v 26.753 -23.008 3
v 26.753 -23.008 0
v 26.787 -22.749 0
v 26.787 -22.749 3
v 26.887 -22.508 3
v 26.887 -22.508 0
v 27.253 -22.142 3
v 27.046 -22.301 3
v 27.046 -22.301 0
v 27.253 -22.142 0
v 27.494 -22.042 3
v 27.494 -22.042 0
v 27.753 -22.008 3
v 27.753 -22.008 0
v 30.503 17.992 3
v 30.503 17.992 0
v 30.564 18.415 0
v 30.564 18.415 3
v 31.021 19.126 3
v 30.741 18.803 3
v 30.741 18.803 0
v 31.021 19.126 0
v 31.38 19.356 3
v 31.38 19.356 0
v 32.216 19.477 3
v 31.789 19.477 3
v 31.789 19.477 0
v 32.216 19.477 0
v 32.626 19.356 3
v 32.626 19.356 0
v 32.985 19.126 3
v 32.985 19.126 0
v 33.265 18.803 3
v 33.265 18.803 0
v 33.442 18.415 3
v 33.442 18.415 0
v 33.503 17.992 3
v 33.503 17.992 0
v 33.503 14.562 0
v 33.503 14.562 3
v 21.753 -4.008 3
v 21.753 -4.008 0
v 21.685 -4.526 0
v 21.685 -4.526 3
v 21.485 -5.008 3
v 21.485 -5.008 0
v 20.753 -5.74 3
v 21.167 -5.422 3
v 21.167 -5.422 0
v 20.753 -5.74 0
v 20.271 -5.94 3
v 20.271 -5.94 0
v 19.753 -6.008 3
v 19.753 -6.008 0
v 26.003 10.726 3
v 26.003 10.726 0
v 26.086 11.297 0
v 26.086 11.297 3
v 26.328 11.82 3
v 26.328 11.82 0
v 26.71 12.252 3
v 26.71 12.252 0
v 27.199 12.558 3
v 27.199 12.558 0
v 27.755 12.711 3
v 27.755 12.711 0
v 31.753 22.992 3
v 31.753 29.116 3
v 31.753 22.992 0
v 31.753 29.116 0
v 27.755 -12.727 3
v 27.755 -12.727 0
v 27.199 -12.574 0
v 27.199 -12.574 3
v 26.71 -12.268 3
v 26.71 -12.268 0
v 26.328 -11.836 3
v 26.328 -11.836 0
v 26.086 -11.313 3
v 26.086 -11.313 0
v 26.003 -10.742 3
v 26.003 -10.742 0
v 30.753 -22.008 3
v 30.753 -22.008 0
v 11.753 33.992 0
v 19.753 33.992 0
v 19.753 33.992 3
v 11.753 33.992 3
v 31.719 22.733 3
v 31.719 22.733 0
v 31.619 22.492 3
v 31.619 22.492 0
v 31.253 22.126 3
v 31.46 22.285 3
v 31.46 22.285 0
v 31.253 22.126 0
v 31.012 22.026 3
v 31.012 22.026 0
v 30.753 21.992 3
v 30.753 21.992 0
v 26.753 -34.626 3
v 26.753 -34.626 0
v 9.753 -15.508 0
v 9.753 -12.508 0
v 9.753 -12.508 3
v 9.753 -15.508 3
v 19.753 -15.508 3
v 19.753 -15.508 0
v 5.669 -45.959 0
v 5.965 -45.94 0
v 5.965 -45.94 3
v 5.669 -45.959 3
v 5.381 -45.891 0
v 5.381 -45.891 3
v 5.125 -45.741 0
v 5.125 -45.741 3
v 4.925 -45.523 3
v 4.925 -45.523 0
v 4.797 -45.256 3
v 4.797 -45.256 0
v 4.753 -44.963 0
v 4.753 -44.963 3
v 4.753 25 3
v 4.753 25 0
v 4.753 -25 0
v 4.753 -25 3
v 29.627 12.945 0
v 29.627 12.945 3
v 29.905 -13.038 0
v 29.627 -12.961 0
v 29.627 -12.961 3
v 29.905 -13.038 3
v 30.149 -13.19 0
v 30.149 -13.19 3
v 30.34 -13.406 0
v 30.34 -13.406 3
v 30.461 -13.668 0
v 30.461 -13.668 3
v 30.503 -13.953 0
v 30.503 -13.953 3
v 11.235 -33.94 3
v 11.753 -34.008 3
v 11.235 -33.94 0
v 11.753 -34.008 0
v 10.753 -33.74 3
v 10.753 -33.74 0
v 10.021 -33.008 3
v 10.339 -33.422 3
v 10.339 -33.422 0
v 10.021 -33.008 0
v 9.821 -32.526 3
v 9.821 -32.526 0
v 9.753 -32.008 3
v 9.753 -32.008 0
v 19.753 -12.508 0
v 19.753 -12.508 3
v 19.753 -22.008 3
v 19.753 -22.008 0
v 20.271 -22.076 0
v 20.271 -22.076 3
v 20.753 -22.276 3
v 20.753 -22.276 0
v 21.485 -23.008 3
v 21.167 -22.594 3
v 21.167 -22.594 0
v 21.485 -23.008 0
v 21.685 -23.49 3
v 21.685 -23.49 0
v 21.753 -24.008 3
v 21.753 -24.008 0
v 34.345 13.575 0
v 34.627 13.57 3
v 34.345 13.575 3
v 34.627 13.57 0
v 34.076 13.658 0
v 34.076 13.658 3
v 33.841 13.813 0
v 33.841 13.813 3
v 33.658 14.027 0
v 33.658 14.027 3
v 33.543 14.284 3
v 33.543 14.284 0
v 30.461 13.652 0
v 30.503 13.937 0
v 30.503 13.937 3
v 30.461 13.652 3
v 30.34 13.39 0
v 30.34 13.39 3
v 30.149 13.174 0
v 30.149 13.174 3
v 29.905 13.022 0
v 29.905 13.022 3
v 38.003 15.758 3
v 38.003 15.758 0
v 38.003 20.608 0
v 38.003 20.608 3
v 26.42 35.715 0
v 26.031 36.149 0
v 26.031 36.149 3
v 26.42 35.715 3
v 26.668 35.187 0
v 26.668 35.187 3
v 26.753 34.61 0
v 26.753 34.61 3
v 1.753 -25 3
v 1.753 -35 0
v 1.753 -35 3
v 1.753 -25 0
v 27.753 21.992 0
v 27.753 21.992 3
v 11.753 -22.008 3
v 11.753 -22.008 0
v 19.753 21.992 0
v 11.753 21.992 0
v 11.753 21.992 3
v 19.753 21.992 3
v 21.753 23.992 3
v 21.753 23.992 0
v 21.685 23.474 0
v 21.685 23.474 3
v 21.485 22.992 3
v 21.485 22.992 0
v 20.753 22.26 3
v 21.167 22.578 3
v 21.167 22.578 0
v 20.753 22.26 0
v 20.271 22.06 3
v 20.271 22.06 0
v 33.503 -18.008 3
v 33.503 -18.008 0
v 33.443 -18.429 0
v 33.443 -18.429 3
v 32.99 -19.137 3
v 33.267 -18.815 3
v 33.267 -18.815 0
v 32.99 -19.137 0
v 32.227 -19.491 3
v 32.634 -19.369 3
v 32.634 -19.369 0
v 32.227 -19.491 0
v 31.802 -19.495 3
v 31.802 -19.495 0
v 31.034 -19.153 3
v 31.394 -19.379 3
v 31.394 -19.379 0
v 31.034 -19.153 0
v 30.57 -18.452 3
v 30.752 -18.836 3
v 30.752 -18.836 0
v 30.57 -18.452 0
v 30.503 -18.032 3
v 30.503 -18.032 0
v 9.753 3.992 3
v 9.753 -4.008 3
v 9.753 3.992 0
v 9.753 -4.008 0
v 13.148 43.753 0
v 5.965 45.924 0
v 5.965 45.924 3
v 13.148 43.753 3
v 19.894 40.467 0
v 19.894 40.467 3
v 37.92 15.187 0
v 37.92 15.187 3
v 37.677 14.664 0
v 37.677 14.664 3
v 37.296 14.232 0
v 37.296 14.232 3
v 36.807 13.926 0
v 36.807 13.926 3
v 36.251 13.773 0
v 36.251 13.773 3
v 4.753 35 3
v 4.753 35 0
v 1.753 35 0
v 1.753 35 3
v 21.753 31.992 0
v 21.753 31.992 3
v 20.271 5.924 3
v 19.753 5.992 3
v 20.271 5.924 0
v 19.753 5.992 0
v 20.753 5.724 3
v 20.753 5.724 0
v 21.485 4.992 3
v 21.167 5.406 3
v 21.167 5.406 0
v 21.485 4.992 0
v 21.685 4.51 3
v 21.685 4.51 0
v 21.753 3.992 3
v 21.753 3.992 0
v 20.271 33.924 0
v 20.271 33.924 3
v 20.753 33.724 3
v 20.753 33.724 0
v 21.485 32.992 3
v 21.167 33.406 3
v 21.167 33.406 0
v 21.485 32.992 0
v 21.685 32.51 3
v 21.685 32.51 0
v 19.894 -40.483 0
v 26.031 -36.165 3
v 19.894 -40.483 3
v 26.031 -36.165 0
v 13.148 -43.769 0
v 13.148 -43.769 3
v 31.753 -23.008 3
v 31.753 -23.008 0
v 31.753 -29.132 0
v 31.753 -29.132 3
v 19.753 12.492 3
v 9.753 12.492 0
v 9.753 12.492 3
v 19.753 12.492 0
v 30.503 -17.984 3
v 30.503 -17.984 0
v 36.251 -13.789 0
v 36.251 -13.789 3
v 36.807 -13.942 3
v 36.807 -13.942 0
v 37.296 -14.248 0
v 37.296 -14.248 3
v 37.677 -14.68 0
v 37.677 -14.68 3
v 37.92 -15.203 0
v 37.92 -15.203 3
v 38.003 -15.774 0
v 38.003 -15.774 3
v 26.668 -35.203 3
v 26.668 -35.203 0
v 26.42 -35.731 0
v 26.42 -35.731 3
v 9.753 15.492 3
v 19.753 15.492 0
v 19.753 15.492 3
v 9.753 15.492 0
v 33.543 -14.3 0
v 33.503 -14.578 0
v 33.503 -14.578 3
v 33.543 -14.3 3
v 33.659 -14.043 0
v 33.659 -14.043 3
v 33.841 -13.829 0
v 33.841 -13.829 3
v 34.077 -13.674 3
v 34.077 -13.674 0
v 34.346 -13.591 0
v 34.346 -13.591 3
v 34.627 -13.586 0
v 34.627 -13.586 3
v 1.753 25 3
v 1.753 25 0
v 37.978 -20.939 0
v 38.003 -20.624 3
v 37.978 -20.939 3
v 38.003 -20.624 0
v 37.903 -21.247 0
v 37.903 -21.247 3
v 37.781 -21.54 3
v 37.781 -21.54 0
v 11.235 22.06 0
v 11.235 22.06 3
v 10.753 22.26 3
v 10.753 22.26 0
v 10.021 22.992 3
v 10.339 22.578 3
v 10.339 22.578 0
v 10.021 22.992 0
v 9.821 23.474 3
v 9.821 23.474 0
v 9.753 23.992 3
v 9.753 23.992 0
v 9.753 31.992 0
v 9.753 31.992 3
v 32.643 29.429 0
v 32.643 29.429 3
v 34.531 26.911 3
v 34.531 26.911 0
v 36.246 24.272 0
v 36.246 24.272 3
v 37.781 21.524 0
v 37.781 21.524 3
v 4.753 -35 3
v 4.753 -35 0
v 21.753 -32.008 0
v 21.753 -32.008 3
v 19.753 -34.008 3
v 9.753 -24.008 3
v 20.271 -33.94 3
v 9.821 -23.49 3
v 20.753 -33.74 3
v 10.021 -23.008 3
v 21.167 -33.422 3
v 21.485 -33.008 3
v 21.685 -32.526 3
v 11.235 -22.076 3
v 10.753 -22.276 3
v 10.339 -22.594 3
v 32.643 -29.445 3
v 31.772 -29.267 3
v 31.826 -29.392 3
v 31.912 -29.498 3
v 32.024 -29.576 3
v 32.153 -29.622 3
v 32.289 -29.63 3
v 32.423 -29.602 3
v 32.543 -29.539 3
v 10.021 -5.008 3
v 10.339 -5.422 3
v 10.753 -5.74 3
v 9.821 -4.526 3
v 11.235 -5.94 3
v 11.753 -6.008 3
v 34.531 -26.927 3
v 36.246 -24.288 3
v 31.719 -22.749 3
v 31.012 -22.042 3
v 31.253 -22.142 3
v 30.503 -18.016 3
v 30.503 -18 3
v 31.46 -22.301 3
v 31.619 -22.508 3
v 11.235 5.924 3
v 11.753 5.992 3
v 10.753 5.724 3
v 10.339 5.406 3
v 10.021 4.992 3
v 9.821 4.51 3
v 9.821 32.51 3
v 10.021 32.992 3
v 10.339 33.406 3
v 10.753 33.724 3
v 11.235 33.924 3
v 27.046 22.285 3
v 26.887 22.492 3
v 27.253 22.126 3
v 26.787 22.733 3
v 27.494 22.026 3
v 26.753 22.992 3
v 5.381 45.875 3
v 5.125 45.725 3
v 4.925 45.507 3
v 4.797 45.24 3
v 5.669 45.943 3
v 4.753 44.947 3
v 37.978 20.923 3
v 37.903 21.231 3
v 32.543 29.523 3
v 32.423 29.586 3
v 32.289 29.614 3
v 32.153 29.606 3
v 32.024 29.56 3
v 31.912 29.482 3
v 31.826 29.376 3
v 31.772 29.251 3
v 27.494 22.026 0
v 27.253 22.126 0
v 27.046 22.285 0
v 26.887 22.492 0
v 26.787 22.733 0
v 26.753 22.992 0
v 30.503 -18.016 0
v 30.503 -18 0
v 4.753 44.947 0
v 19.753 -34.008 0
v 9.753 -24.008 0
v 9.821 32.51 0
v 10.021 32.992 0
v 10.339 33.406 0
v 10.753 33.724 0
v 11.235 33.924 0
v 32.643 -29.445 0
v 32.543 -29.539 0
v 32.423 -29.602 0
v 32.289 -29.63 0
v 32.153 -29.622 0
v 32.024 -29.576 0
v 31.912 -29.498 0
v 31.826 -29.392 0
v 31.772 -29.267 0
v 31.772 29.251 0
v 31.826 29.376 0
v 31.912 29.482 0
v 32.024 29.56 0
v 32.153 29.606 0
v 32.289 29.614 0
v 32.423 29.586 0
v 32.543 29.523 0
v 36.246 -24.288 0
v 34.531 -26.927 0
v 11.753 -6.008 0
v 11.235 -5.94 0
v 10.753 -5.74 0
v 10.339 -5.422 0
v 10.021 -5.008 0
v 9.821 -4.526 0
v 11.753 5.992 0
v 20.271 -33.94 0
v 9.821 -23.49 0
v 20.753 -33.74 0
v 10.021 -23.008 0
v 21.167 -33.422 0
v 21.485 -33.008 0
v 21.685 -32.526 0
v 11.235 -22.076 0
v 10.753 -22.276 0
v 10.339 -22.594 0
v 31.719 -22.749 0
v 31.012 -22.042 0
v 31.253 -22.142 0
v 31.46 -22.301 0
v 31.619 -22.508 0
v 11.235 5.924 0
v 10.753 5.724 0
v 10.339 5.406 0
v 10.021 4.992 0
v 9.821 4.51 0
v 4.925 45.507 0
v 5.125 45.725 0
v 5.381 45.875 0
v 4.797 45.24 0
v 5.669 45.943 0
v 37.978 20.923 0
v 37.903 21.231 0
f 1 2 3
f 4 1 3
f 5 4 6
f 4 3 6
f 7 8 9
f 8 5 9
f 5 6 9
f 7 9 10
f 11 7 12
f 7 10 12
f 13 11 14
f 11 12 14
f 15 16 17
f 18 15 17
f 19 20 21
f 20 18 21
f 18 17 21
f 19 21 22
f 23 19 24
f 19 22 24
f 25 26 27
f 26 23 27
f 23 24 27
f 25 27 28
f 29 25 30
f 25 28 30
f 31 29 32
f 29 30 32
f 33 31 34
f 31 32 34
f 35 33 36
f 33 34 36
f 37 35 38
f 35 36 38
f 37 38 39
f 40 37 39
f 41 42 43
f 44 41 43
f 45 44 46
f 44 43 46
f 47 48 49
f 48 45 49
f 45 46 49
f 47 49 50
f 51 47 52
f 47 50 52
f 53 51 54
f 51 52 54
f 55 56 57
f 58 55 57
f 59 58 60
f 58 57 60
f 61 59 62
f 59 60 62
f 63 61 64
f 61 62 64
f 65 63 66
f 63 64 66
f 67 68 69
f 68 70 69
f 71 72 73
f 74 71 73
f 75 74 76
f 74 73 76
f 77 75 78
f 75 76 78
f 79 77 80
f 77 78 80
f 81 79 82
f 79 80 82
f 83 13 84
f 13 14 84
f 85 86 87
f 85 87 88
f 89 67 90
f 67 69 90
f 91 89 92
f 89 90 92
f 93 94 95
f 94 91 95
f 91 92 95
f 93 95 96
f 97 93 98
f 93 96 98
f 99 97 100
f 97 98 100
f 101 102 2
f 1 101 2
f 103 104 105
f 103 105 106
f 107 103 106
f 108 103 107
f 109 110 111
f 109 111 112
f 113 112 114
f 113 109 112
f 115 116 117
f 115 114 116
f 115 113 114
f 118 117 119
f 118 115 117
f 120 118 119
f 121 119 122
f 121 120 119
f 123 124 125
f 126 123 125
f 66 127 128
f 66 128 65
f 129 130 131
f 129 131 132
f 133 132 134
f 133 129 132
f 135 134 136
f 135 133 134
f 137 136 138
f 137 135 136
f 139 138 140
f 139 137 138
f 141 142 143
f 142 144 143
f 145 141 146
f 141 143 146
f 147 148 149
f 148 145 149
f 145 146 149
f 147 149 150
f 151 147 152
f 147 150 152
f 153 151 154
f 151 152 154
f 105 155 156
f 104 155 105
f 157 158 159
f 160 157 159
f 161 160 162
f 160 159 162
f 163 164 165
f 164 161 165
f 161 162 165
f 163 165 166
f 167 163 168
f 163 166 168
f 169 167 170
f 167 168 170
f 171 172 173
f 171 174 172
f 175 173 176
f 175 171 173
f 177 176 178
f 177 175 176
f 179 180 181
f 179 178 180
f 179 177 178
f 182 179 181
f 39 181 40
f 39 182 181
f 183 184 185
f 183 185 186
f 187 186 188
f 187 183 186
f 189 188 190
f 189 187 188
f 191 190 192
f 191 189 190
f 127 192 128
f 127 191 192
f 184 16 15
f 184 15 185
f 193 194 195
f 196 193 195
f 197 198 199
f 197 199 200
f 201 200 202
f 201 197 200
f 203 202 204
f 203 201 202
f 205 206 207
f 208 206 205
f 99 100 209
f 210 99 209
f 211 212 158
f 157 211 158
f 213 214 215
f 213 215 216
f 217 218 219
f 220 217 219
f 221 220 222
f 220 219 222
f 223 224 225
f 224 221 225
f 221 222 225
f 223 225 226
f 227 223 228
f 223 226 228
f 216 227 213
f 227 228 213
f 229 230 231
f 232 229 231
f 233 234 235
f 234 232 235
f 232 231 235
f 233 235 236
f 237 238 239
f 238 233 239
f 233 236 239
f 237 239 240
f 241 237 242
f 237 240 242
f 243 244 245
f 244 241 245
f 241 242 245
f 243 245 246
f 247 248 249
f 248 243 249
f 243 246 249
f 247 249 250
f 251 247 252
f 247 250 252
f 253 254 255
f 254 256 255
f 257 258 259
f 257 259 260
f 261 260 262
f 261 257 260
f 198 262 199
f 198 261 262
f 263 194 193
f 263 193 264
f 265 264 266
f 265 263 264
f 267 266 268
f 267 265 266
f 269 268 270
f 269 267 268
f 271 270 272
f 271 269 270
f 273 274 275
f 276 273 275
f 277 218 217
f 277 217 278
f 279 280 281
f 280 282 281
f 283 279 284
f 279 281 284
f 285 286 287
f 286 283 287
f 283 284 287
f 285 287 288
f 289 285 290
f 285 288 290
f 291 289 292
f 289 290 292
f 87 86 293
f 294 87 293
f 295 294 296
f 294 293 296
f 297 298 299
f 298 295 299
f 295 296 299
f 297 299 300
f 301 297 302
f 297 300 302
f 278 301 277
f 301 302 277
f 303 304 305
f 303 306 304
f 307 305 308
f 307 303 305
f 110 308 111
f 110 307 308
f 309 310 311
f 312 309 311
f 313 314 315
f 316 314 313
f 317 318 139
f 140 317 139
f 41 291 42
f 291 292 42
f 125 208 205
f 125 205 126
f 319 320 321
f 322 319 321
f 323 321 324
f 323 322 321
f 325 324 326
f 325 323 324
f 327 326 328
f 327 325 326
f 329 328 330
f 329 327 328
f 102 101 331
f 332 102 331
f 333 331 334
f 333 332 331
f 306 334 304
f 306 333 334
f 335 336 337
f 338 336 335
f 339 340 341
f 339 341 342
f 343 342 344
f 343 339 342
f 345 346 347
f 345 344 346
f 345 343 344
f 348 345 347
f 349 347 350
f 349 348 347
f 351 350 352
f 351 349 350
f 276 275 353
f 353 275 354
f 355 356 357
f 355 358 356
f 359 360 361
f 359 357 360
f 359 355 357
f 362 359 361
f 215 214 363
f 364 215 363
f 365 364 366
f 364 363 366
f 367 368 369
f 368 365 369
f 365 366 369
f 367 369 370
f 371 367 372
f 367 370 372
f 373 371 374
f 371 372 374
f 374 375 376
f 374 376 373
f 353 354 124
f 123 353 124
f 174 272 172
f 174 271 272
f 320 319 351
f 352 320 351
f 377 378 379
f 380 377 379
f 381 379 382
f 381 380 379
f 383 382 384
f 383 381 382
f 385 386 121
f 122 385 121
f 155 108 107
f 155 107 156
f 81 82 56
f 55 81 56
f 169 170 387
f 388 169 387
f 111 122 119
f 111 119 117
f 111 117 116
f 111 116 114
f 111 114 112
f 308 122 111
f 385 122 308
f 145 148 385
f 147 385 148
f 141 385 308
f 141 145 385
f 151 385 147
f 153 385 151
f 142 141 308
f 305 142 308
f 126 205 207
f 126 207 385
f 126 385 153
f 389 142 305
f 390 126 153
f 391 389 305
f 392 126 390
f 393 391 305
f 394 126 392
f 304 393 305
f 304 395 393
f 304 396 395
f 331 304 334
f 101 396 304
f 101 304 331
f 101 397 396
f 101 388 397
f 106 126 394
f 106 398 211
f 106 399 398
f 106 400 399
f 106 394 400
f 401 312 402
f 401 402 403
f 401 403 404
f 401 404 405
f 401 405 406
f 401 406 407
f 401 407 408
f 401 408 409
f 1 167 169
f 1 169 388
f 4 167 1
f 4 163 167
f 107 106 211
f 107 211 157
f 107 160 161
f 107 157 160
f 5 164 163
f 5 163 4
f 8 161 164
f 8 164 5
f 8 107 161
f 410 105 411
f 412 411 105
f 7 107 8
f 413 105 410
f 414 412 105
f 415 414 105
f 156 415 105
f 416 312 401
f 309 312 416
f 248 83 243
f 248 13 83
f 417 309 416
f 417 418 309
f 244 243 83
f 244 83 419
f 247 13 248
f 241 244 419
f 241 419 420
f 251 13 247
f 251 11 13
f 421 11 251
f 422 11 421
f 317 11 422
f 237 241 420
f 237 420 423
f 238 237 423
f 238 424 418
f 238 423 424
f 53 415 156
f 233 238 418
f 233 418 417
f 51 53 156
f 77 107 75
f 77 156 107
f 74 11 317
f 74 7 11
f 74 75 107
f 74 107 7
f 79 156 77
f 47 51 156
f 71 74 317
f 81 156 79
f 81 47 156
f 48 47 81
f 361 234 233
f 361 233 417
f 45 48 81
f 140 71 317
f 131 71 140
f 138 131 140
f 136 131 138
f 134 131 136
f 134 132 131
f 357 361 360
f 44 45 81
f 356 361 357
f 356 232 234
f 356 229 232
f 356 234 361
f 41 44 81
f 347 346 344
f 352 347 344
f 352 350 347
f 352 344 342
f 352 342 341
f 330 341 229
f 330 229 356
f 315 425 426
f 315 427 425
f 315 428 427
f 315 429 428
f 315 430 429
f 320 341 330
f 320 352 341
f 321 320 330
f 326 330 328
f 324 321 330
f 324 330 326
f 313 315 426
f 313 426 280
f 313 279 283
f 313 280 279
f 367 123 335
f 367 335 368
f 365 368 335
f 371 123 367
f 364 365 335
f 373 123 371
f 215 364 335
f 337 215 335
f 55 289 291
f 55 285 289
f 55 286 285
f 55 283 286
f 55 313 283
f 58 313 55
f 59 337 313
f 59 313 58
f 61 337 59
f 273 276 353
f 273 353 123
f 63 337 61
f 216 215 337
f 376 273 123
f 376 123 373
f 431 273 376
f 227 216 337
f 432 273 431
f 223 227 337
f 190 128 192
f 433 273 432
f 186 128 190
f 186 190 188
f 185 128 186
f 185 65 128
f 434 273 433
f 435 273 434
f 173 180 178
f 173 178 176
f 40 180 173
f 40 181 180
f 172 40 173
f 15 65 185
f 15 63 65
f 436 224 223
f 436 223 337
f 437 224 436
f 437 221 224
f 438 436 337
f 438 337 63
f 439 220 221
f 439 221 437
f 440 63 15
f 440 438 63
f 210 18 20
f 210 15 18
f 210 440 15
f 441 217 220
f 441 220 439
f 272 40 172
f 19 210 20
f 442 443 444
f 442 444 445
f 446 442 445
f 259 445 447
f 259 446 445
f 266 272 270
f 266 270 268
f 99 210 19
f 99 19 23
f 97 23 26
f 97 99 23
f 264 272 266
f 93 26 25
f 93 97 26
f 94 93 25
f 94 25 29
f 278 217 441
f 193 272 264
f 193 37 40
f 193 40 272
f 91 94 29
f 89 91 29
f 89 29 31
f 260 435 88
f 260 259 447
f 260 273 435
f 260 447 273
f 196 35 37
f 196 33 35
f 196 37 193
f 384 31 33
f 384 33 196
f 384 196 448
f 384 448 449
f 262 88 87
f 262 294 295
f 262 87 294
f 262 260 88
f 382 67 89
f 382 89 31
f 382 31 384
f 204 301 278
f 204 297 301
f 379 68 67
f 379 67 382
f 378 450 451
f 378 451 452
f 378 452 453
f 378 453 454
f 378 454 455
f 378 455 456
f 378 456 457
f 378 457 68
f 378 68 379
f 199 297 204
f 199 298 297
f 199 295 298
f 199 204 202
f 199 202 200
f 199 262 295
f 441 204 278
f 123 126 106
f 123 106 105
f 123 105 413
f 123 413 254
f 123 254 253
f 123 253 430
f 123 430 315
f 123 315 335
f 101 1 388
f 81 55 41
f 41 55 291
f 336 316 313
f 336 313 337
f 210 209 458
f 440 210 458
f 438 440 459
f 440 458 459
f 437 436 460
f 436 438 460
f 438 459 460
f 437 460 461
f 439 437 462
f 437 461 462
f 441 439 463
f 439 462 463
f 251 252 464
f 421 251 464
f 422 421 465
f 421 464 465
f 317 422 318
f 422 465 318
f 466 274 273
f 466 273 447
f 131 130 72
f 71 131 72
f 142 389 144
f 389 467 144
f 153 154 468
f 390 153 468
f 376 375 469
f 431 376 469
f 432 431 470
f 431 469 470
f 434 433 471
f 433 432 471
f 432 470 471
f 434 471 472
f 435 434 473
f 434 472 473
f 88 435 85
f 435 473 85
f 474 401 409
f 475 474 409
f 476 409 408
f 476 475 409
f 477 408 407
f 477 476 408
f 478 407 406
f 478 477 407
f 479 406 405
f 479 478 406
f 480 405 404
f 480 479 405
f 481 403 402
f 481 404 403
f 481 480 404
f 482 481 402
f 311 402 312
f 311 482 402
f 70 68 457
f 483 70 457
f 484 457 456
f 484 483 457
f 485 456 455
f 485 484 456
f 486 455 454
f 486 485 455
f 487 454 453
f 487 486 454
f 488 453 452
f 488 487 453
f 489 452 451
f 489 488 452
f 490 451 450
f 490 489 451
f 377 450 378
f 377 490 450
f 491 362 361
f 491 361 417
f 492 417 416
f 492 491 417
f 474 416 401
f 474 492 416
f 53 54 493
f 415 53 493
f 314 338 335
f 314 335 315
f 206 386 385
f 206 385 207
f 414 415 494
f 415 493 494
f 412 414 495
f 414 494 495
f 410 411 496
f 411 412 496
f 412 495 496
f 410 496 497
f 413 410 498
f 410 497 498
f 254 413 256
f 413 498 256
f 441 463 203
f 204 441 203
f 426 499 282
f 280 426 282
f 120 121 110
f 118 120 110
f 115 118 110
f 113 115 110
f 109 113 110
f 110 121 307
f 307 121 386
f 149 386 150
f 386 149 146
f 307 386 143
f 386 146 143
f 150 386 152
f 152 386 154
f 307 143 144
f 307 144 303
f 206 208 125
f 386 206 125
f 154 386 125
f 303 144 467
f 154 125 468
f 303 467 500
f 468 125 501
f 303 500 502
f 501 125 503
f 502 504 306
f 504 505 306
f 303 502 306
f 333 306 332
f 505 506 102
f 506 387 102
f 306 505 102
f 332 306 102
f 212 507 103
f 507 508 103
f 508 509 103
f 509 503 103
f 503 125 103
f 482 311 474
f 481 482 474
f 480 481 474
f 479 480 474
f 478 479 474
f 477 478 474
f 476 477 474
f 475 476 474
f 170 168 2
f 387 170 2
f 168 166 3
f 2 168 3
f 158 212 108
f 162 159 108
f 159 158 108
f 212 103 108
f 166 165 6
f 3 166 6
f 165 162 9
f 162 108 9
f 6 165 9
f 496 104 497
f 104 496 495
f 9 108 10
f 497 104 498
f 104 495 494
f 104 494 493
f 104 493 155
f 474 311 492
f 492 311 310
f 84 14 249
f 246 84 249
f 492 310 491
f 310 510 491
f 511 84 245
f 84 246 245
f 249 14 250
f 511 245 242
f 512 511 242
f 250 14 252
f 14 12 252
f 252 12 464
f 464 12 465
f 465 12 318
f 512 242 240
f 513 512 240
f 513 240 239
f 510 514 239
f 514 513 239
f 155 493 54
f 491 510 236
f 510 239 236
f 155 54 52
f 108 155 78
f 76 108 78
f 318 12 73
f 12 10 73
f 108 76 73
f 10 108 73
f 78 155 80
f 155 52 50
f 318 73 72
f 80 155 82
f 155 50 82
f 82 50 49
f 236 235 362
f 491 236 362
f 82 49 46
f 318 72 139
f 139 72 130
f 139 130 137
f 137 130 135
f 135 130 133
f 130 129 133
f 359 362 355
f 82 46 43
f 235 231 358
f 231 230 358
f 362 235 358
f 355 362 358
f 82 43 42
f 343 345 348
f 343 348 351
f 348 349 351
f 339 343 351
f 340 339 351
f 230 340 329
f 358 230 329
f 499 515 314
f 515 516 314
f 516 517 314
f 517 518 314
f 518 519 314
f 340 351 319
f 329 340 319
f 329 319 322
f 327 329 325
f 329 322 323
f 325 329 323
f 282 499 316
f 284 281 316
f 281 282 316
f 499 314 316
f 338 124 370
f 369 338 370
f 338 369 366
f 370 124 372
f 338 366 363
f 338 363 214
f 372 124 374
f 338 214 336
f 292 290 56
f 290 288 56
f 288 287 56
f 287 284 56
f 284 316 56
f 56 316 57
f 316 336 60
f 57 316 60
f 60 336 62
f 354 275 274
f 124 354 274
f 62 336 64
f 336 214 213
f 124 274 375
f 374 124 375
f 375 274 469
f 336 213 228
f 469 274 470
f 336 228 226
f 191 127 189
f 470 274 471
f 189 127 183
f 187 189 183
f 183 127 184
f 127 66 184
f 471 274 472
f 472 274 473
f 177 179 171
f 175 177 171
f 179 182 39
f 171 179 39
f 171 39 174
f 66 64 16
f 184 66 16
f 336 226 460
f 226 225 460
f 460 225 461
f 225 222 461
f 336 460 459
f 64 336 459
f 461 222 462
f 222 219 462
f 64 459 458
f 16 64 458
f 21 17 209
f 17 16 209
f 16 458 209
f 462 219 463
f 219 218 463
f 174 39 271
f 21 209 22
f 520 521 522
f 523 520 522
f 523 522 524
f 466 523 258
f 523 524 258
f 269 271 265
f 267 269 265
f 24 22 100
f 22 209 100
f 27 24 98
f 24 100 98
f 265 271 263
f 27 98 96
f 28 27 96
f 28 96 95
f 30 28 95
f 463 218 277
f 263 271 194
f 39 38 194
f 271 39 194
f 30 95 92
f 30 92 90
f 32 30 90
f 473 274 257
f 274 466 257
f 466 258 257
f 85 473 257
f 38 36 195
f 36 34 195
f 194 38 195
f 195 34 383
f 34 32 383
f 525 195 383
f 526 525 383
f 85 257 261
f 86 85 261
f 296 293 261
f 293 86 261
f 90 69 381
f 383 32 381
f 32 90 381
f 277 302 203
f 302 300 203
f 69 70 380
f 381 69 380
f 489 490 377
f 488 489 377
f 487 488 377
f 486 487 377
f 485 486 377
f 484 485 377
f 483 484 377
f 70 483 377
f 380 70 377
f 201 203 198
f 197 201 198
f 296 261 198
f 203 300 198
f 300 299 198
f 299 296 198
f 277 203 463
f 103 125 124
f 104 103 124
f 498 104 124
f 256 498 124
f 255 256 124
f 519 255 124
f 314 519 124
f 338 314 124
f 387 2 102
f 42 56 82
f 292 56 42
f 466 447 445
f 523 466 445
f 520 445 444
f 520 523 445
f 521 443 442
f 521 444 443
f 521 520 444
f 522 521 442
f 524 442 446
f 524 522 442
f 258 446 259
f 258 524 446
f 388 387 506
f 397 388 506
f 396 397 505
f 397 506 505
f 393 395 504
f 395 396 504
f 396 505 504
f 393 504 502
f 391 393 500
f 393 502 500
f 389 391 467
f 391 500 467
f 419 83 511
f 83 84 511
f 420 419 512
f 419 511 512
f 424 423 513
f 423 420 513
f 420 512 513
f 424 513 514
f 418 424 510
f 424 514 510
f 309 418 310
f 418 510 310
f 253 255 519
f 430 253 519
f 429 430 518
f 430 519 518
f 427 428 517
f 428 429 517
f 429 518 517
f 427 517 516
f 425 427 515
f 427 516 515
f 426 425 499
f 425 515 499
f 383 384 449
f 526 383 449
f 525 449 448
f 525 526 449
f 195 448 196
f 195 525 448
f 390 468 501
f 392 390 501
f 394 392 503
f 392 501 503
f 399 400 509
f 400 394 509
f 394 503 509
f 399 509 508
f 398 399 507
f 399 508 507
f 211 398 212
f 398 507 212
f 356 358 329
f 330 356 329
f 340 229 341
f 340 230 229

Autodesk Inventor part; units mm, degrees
ref_plane "YZ Plane" through (0, 0, 0) normal (1, 0, 0) x (0, 1, 0)
ref_plane "XZ Plane" through (0, 0, 0) normal (0, 1, 0) x (-1, 0, 0)
ref_plane "XY Plane" through (0, 0, 0) normal (0, 0, 1) x (1, 0, 0)
sketch "Sketch1" plane through (0, 0, 0) normal (0, 0, 1) x (1, 0, 0)
  line L0 (1.7529, 25) -> (4.7529, 25)
  line L1 (4.7529, 35) -> (1.7529, 35)
  line L2 (1.7529, 35) -> (1.7529, 25)
  line L3 (1.7529, -25) -> (4.7529, -25)
  line L4 (4.7529, -35) -> (1.7529, -35)
  line L5 (1.7529, -35) -> (1.7529, -25)
  line L6 (26.0029, -10.7424) -> (26.0029, 10.7264)
  line L7 (38.0029, -20.6235) -> (38.0029, -15.7736)
  line L8 (38.0029, 15.7576) -> (38.0029, 20.6075)
  line L9 (36.251, 13.773) -> (34.6269, 13.57)
  line L10 (29.6269, 12.945) -> (27.7548, 12.711)
  line L11 (36.251, -13.789) -> (34.6271, -13.586)
  line L12 (29.6269, -12.961) -> (27.7548, -12.727)
  arc A0 (26.0029, -10.7424) -> (27.7548, -12.727) centre (28.0029, -10.7424) ccw
  arc A1 (27.7548, 12.711) -> (26.0029, 10.7264) centre (28.0029, 10.7264) ccw
  arc A2 (38.0029, -15.7736) -> (36.251, -13.789) centre (36.0029, -15.7736) ccw
  arc A3 (36.251, 13.773) -> (38.0029, 15.7576) centre (36.0029, 15.7576) ccw
  arc A4 (30.5029, -13.9533) -> (29.6269, -12.961) centre (29.5029, -13.9533) ccw
  arc A5 (34.6271, -13.586) -> (33.5031, -14.5783) centre (34.5031, -14.5783) ccw
  arc A6 (33.5029, 14.5623) -> (34.6269, 13.57) centre (34.5029, 14.5623) ccw
  arc A7 (29.6269, 12.945) -> (30.5029, 13.9373) centre (29.5029, 13.9373) ccw
  arc A8 (38.0029, 20.6075) -> (37.7807, 21.5238) centre (36.0029, 20.6075) ccw
  arc A9 (37.7807, -21.5398) -> (38.0029, -20.6235) centre (36.0029, -20.6235) ccw
  line L13 (4.7529, -35) -> (4.7529, -44.9628)
  line L14 (4.7529, 35) -> (4.7529, 44.9468)
  line L15 (4.7529, 25) -> (4.7529, -25)
  line L16 (9.7529, -15.508) -> (19.7529, -15.508)
  line L17 (19.7529, -15.508) -> (19.7529, -12.508)
  line L18 (19.7529, -12.508) -> (9.7529, -12.508)
  line L19 (9.7529, -12.508) -> (9.7529, -15.508)
  line L20 (9.7529, 12.492) -> (19.7529, 12.492)
  line L21 (19.7529, 12.492) -> (19.7529, 15.492)
  line L22 (19.7529, 15.492) -> (9.7529, 15.492)
  line L23 (9.7529, 15.492) -> (9.7529, 12.492)
  arc A10 (4.7529, -44.9628) -> (5.9649, -45.9401) centre (5.7529, -44.9628) ccw
  arc A11 (5.9649, 45.9241) -> (4.7529, 44.9468) centre (5.7529, 44.9468) ccw
  line L24 (19.7529, -6.008) -> (11.7529, -6.008)
  line L25 (9.7529, -4.008) -> (9.7529, 3.992)
  line L26 (11.7529, 5.992) -> (19.7529, 5.992)
  line L27 (21.7529, 3.992) -> (21.7529, -4.008)
  line L28 (11.7529, 21.992) -> (19.7529, 21.992)
  line L29 (21.7529, 23.992) -> (21.7529, 31.992)
  line L30 (19.7529, 33.992) -> (11.7529, 33.992)
  line L31 (9.7529, 31.992) -> (9.7529, 23.992)
  line L32 (11.7529, -22.008) -> (19.7529, -22.008)
  line L33 (21.7529, -24.008) -> (21.7529, -32.008)
  line L34 (19.7529, -34.008) -> (11.7529, -34.008)
  line L35 (9.7529, -32.008) -> (9.7529, -24.008)
  arc A12 (11.7529, 5.992) -> (9.7529, 3.992) centre (11.7529, 3.992) ccw
  arc A13 (21.7529, 3.992) -> (19.7529, 5.992) centre (19.7529, 3.992) ccw
  arc A14 (19.7529, -6.008) -> (21.7529, -4.008) centre (19.7529, -4.008) ccw
  arc A15 (9.7529, -4.008) -> (11.7529, -6.008) centre (11.7529, -4.008) ccw
  arc A16 (11.7529, -22.008) -> (9.7529, -24.008) centre (11.7529, -24.008) ccw
  arc A17 (21.7529, -24.008) -> (19.7529, -22.008) centre (19.7529, -24.008) ccw
  arc A18 (19.7529, -34.008) -> (21.7529, -32.008) centre (19.7529, -32.008) ccw
  arc A19 (9.7529, -32.008) -> (11.7529, -34.008) centre (11.7529, -32.008) ccw
  arc A20 (11.7529, 33.992) -> (9.7529, 31.992) centre (11.7529, 31.992) ccw
  arc A21 (21.7529, 31.992) -> (19.7529, 33.992) centre (19.7529, 31.992) ccw
  arc A22 (19.7529, 21.992) -> (21.7529, 23.992) centre (19.7529, 23.992) ccw
  arc A23 (9.7529, 23.992) -> (11.7529, 21.992) centre (11.7529, 23.992) ccw
  line L36 (31.7529, 29.1156) -> (31.7529, 22.992)
  line L37 (30.7529, 21.992) -> (27.7529, 21.992)
  line L38 (26.7529, 22.992) -> (26.7529, 34.6104)
  arc A24 (37.7807, 21.5238) -> (32.6427, 29.4288) centre (-3.9971, -0.008) ccw
  arc A25 (26.0307, 36.149) -> (5.9649, 45.9241) centre (-3.9971, -0.008) ccw
  line L39 (27.7529, -22.008) -> (30.7529, -22.008)
  line L40 (31.7529, -23.008) -> (31.7529, -29.1317)
  line L41 (26.7529, -34.6265) -> (26.7529, -23.008)
  arc A26 (5.9649, -45.9401) -> (26.0307, -36.1651) centre (-3.9971, -0.008) ccw
  arc A27 (32.6427, -29.4448) -> (37.7807, -21.5398) centre (-3.9971, -0.008) ccw
  arc A28 (32.6427, 29.4288) -> (31.7529, 29.1156) centre (32.2529, 29.1156) ccw
  arc A29 (31.7529, -29.1317) -> (32.6427, -29.4448) centre (32.2529, -29.1317) ccw
  arc A30 (26.0307, -36.1651) -> (26.7529, -34.6265) centre (24.7529, -34.6265) ccw
  arc A31 (26.7529, 34.6104) -> (26.0307, 36.149) centre (24.7529, 34.6104) ccw
  arc A32 (30.7529, 21.992) -> (31.7529, 22.992) centre (30.7529, 22.992) ccw
  arc A33 (26.7529, 22.992) -> (27.7529, 21.992) centre (27.7529, 22.992) ccw
  arc A34 (31.7529, -23.008) -> (30.7529, -22.008) centre (30.7529, -23.008) ccw
  arc A35 (27.7529, -22.008) -> (26.7529, -23.008) centre (27.7529, -23.008) ccw
  arc A36 (30.5029, -17.9841) -> (33.5031, -18.008) centre (32.0029, -18.008) ccw
  arc A37 (33.5029, 17.992) -> (30.5029, 17.992) centre (32.0029, 17.992) ccw
  line L42 (30.5029, 17.992) -> (30.5029, 13.9373)
  line L43 (33.5029, 17.992) -> (33.5029, 14.5623)
  line L44 (30.5029, -18.032) -> (30.5029, -13.9533)
  line L45 (33.5031, -18.008) -> (33.5031, -14.5783)
  point P0 (4.7529, -46.1863)
  point P1 (4.7529, 46.1703)
  point P2 (38.0029, -21.103)
  point P3 (38.0029, 21.087)
  point P4 (38.0029, -14.008)
  point P5 (38.0029, 13.992)
  point P6 (26.0029, -12.508)
  point P7 (9.7529, 5.992)
  point P8 (9.7529, -6.008)
  point P9 (21.7529, 5.992)
  point P10 (21.7529, 33.992)
  point P11 (21.7529, 21.992)
  point P12 (9.7529, 33.992)
  point P13 (21.7529, -34.008)
  point P14 (21.7529, -22.008)
  point P15 (9.7529, -34.008)
  point P16 (26.7529, 35.5369)
  point P17 (31.7529, 30.5033)
  point P18 (26.7529, -22.008)
  point P19 (26.7529, -35.5529)
  point P20 (31.7529, -30.5193)
  dimension "d13" = 10
  dimension "d17" = 10
  dimension "d70" = 3
  dimension "d72" = 3
  dimension "d88" = 28
  dimension "d90" = 1.5
  dimension "d92" = 14
  dimension "d99" = 2
  dimension "d100" = 2
  dimension "d101" = 1
  dimension "d102" = 2
  dimension "d105" = 10
  dimension "d106" = 3
  dimension "d107" = 10
  dimension "d108" = 3
  dimension "d109" = 5
  dimension "d110" = 5
  dimension "d111" = 25
  dimension "d112" = 12.5
  dimension "d115" = 1
  dimension "d117" = 8.75
  dimension "d118" = 12
  dimension "d119" = 12
  dimension "d120" = 5
  dimension "d121" = 6.5
  dimension "d123" = 5
  dimension "d126" = 6.5
  dimension "d127" = 12
  dimension "d128" = 12
  dimension "d129" = 6.5
  dimension "d130" = 12
  dimension "d131" = 12
  dimension "d132" = 2
  dimension "d135" = 5
  dimension "d136" = 5
  dimension "d137" = 5
  dimension "d138" = 6.5
  dimension "d139" = 5
  dimension "d140" = 5
  dimension "d141" = 0.5
  dimension "d142" = 2
  dimension "d143" = 1
  dimension "d144" = 3
  dimension "d147" = 4
  dimension "d148" = 4
extrude "Extrusion8" add sketch "Sketch1" along normal blind 3
properties part number "OpenROV 2.3 Dev EBoard Plug Mount"
